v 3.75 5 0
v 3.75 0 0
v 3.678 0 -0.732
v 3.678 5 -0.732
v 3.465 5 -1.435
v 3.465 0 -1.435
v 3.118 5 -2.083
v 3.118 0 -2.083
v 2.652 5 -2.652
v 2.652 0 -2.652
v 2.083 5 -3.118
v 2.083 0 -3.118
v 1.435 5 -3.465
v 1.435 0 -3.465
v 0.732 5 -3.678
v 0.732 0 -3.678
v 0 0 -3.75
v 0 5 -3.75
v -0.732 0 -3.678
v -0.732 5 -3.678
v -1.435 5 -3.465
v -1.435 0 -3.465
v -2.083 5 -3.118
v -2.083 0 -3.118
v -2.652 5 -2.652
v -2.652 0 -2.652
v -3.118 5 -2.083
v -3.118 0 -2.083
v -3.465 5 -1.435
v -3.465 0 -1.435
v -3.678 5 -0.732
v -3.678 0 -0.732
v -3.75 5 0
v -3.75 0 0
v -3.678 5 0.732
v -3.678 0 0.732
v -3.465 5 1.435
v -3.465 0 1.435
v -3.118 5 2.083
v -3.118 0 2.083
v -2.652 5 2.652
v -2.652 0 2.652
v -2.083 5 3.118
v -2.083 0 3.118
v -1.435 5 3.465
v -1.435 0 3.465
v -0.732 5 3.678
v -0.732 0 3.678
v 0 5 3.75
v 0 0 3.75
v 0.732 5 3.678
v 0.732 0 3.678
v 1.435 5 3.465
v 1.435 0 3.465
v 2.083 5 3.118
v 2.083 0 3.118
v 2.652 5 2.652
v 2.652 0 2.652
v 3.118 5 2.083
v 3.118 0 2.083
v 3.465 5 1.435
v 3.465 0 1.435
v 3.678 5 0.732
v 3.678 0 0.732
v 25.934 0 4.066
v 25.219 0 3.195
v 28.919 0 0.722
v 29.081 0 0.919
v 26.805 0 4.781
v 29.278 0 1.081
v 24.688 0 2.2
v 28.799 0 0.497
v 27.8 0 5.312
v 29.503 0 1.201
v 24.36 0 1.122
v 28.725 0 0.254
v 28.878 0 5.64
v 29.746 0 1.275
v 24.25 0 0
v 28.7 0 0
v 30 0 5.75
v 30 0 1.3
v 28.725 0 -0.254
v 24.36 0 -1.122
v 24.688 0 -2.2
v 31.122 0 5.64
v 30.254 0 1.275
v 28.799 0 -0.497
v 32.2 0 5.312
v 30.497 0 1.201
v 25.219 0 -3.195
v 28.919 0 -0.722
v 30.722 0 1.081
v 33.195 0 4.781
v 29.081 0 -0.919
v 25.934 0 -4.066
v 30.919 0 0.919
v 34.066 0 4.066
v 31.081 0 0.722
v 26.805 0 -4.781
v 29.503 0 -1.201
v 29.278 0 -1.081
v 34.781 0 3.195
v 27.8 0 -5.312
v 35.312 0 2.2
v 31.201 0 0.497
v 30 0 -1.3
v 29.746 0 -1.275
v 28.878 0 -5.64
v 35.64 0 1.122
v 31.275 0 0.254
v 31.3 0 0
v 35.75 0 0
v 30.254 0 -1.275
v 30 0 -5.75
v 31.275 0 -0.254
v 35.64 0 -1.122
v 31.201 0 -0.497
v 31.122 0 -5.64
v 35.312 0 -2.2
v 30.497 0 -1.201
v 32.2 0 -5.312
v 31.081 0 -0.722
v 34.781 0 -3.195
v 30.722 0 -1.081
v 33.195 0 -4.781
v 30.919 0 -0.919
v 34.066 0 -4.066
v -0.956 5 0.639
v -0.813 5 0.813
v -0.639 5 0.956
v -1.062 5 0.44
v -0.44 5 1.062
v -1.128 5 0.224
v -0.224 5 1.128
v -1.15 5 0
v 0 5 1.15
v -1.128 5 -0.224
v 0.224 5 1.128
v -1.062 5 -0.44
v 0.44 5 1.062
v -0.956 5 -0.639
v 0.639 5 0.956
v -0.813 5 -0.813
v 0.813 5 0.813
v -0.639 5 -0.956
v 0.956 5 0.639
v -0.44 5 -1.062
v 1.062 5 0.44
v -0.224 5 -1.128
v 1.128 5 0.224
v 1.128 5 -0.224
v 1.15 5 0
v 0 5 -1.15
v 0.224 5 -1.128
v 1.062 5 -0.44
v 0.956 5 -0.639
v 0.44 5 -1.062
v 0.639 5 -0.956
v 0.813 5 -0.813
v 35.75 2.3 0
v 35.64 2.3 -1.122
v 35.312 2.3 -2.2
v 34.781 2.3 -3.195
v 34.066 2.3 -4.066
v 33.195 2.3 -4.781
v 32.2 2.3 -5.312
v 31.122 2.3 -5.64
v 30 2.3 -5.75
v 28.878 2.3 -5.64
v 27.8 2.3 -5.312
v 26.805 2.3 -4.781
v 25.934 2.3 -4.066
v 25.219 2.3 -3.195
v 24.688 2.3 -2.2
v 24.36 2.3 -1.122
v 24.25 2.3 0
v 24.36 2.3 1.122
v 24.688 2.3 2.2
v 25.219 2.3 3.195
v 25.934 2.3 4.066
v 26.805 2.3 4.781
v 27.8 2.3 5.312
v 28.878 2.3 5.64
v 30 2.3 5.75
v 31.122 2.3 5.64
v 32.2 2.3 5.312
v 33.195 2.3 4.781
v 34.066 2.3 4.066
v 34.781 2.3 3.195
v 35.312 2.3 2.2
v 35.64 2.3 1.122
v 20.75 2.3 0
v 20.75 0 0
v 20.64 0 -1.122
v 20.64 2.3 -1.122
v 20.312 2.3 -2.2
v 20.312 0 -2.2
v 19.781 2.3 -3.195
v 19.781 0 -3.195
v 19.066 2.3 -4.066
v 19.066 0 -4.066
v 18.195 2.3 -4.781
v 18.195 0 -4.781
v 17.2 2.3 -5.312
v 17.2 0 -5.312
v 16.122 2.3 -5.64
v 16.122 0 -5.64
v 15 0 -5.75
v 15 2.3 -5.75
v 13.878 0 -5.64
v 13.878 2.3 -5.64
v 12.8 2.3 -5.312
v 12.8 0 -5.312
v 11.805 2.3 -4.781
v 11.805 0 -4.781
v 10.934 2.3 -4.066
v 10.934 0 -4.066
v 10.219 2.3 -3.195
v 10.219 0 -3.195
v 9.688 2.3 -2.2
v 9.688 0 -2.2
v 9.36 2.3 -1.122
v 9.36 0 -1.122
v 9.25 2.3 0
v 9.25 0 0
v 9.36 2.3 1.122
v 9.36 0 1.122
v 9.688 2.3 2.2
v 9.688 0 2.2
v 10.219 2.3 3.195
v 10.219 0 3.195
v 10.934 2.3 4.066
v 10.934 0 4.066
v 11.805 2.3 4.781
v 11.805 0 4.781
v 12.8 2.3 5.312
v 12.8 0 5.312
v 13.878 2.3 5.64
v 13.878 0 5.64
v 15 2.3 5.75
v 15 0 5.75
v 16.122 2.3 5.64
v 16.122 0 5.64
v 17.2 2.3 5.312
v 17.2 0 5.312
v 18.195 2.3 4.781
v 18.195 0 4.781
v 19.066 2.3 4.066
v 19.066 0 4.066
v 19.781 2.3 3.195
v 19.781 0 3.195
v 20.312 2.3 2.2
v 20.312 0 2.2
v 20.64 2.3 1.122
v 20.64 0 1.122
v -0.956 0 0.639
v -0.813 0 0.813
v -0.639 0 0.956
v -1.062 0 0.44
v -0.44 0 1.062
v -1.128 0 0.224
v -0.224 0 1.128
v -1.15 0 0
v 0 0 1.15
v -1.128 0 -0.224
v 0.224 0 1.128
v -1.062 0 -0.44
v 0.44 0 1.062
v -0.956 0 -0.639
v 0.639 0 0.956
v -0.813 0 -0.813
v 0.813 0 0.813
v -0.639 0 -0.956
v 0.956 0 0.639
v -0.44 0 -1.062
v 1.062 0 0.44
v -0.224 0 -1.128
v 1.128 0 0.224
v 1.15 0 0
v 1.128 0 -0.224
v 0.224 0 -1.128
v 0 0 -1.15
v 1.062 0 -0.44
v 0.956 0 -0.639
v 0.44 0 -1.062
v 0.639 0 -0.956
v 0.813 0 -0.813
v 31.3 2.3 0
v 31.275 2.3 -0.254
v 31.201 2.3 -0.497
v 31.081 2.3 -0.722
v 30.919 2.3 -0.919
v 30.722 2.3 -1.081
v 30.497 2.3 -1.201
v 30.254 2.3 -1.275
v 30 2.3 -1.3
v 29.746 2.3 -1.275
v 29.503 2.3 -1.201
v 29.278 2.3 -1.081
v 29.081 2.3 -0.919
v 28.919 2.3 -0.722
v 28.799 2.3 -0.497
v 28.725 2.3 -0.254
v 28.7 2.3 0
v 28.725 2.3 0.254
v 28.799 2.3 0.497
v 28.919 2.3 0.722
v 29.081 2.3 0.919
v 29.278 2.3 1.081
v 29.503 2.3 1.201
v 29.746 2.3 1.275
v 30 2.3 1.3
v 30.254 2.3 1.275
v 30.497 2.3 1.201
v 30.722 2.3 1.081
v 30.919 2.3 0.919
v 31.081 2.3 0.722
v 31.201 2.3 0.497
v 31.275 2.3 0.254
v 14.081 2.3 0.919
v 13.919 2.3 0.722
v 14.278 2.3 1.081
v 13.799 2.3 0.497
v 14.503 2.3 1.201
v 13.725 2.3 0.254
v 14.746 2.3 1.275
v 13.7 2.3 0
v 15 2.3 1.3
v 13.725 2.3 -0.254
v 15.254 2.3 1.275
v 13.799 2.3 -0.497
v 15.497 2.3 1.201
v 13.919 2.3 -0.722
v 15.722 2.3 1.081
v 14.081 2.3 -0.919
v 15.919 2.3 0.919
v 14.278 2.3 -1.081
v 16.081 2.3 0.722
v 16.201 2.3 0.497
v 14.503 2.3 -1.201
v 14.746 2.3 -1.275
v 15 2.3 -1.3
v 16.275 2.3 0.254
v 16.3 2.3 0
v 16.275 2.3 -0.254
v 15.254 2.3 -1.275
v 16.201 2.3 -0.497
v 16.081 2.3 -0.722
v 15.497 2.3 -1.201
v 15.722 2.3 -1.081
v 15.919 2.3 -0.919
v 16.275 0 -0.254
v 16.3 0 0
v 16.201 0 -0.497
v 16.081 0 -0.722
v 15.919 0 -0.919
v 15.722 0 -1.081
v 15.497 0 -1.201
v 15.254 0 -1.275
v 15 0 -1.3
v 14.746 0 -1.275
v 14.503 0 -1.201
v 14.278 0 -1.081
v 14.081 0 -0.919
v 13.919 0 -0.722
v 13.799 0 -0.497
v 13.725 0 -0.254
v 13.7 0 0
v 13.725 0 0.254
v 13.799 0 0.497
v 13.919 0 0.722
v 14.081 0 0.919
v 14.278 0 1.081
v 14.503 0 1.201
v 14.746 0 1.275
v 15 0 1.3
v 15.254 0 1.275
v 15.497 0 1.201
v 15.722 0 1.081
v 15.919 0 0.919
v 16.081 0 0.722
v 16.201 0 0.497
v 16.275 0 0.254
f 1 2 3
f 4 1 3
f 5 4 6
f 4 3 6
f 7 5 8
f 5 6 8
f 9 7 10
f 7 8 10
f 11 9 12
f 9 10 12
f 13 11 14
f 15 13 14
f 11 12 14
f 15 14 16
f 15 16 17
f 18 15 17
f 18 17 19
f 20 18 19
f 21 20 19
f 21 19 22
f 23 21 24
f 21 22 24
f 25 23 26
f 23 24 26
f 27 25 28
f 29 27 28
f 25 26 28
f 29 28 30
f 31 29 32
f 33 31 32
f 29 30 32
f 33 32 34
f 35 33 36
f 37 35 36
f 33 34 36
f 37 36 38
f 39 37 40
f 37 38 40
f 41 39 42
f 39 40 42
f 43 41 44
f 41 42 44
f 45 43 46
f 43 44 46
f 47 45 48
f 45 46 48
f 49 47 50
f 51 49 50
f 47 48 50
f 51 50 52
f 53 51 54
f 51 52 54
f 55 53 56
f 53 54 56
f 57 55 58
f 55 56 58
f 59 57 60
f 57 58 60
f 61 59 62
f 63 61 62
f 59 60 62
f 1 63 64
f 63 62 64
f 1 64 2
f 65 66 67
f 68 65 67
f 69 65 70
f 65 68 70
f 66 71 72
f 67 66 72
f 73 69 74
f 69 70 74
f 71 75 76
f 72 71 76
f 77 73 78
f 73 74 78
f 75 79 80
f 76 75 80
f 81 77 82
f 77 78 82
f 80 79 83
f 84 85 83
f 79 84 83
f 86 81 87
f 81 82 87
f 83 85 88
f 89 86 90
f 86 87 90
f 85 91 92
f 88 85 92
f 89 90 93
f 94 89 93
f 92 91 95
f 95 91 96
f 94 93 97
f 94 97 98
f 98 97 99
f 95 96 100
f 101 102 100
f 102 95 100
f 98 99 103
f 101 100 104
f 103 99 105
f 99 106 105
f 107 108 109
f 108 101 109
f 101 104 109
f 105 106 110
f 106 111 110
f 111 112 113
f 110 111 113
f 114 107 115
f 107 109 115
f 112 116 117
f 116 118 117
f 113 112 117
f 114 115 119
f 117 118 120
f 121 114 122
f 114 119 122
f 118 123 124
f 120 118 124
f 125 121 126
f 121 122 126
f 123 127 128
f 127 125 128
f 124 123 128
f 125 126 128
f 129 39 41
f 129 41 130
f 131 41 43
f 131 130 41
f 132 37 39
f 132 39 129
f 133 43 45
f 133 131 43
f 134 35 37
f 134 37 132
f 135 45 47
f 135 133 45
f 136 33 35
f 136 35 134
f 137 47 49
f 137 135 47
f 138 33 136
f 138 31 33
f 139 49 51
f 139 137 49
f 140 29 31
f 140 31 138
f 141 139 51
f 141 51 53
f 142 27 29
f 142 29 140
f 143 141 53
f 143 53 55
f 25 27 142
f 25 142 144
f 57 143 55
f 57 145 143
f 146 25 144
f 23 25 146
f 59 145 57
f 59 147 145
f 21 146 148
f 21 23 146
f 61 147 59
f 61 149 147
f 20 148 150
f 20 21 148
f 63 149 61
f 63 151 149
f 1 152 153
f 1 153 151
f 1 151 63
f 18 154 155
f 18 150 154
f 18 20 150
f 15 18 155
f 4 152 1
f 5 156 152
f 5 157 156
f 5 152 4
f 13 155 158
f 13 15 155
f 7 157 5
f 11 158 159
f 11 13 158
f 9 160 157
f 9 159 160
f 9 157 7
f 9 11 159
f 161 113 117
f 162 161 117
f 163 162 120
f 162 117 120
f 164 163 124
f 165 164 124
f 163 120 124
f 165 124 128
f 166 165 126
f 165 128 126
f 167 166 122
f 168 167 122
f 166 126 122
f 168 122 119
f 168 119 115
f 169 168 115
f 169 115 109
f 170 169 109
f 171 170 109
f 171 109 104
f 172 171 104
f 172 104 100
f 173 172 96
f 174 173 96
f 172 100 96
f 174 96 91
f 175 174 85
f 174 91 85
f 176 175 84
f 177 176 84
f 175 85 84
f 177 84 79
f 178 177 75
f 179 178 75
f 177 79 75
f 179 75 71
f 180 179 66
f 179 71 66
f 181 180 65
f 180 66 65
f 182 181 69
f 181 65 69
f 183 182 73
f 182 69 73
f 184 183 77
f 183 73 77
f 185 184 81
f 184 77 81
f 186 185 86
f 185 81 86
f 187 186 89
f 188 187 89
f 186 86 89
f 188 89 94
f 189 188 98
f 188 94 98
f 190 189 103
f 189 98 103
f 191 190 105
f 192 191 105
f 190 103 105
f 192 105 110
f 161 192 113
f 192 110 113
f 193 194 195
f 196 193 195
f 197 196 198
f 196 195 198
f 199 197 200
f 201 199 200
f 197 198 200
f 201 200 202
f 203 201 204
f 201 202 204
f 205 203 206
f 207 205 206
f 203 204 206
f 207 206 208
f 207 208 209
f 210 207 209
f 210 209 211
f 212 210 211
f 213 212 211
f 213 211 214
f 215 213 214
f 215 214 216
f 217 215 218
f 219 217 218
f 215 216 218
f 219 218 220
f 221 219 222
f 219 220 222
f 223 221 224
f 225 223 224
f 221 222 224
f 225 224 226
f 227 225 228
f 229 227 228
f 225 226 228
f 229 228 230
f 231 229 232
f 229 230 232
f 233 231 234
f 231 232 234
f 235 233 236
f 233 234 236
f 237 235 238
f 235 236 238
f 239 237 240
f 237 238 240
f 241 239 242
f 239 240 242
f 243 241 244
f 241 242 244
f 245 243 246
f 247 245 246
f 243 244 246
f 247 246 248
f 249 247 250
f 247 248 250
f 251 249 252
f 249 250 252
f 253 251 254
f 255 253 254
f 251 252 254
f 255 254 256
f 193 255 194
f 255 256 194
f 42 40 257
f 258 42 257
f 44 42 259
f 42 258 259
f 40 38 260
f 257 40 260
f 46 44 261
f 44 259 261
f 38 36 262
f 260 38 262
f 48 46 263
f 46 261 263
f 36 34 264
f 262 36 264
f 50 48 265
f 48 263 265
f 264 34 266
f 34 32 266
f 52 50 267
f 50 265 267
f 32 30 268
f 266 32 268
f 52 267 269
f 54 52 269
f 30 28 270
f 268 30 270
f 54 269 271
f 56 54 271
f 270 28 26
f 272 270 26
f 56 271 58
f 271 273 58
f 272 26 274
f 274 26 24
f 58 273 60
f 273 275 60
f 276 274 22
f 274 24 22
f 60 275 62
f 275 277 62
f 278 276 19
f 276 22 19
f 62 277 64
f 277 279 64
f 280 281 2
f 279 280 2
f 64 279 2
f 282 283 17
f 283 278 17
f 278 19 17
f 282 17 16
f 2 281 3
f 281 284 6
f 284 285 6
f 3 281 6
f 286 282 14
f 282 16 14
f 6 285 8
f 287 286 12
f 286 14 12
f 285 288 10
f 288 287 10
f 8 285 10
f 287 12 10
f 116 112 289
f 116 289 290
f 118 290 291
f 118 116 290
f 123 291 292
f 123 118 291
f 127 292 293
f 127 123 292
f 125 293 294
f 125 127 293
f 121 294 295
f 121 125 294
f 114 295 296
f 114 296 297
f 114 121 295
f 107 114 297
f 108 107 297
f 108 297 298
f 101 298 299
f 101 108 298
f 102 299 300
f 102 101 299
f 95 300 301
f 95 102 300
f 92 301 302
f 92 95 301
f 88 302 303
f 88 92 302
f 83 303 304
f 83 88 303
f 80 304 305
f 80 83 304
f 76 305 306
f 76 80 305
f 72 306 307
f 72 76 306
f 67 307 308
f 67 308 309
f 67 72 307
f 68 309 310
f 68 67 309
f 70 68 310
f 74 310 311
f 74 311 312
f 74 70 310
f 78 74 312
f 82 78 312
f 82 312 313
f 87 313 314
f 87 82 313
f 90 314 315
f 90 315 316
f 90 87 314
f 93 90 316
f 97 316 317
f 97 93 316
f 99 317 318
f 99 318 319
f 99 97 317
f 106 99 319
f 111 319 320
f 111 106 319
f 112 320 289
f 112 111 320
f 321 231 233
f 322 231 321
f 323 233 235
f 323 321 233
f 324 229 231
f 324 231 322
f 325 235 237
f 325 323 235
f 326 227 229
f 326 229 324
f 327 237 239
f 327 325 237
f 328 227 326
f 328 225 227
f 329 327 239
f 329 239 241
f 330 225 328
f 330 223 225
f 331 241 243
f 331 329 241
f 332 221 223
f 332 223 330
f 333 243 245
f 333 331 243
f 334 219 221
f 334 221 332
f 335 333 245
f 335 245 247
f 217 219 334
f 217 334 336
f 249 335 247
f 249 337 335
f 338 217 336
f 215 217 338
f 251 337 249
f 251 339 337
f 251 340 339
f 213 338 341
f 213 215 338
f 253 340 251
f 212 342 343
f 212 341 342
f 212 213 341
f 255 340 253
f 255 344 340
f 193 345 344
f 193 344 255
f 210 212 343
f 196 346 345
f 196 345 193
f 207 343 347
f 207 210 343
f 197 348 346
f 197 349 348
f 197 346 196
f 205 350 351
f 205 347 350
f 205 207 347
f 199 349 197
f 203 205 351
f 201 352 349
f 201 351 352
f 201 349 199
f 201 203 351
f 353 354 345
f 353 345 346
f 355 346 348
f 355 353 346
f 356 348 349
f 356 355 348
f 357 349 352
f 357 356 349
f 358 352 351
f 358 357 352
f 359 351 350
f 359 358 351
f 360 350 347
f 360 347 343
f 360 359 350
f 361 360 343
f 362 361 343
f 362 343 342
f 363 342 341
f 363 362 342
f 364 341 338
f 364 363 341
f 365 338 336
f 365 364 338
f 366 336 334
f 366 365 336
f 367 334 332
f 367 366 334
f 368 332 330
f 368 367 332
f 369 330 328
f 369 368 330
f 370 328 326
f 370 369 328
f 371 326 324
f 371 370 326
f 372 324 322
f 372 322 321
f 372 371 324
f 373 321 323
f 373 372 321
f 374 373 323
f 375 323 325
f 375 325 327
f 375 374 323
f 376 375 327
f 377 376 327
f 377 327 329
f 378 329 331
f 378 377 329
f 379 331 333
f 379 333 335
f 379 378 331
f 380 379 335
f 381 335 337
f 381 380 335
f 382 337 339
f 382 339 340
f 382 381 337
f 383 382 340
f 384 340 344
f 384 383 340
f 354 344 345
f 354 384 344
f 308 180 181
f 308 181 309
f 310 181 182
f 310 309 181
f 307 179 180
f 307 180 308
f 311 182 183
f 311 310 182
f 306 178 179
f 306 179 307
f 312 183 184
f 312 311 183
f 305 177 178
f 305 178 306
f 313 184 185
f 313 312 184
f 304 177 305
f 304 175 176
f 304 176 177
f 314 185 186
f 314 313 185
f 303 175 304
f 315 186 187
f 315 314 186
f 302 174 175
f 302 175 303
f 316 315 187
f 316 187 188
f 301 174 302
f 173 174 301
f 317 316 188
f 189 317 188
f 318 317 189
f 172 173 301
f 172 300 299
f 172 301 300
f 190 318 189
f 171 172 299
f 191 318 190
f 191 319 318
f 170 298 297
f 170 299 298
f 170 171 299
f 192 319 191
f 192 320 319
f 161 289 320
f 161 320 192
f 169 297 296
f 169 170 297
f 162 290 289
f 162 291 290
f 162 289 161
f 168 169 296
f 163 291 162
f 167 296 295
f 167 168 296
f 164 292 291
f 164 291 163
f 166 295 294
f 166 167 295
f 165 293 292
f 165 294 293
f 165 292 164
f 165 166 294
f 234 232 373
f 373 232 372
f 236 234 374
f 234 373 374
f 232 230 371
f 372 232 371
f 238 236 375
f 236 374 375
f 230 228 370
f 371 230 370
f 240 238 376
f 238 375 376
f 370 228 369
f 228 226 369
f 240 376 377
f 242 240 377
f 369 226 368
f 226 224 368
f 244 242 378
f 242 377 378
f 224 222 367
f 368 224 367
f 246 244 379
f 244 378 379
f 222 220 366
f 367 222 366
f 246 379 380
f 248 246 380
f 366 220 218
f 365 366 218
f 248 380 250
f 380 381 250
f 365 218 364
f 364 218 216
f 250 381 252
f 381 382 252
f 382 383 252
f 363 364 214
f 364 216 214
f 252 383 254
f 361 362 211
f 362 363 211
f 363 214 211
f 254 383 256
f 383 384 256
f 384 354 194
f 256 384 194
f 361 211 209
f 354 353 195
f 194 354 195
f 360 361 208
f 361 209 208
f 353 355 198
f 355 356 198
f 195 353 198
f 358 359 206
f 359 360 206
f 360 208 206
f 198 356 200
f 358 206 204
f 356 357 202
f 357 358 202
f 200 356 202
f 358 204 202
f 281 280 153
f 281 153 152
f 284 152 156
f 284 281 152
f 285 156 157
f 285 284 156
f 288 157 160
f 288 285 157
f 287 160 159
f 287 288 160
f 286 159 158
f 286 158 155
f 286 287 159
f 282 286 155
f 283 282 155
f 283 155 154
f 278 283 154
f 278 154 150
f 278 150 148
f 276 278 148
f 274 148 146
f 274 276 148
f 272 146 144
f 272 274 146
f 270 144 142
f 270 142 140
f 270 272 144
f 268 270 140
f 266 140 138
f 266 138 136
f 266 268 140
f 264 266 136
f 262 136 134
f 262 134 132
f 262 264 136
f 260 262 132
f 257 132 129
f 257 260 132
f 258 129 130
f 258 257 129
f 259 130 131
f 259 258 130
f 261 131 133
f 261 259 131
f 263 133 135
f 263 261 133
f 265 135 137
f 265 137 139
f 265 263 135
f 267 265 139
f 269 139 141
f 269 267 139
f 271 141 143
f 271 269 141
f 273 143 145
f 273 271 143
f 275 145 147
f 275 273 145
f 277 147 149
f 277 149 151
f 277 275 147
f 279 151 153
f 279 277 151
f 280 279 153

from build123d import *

# Parameters (mm, degrees)
SKETCH1_R             = 3.75
SKETCH1_R_2           = 1.15
BOSS_EXTRUDE1_DEPTH   = 5
SKETCH2_R             = 5.75
SKETCH2_R_2           = 1.3
BOSS_EXTRUDE2_DEPTH   = 2.3
BOSS_EXTRUDE2_2_DEPTH = 2.3


with BuildPart() as part:
    # Sketch1 → Boss-Extrude1 (new body)
    with BuildSketch(Plane(origin=(0, 0, 0), x_dir=(1, 0, 0), z_dir=(0, 1, 0))):
        Circle(SKETCH1_R)
        Circle(SKETCH1_R_2, mode=Mode.SUBTRACT)
    extrude(amount=BOSS_EXTRUDE1_DEPTH)


with BuildPart() as body_2:
    # Sketch2 → Boss-Extrude2 (new body)
    with BuildSketch(Plane(origin=(0, 0, 0), x_dir=(1, 0, 0), z_dir=(0, 1, 0))):
        with Locations((15, 0)):
            Circle(SKETCH2_R)
        with Locations((15, 0)):
            Circle(SKETCH2_R_2, mode=Mode.SUBTRACT)
    extrude(amount=BOSS_EXTRUDE2_DEPTH)


with BuildPart() as body_3:
    # Sketch2 → Boss-Extrude2 2 (new body)
    with BuildSketch(Plane(origin=(0, 0, 0), x_dir=(1, 0, 0), z_dir=(0, 1, 0))):
        with Locations((30, 0)):
            Circle(SKETCH2_R)
        with Locations((30, 0)):
            Circle(SKETCH2_R_2, mode=Mode.SUBTRACT)
    extrude(amount=BOSS_EXTRUDE2_2_DEPTH)


solid = Compound([part.part, body_2.part, body_3.part])
